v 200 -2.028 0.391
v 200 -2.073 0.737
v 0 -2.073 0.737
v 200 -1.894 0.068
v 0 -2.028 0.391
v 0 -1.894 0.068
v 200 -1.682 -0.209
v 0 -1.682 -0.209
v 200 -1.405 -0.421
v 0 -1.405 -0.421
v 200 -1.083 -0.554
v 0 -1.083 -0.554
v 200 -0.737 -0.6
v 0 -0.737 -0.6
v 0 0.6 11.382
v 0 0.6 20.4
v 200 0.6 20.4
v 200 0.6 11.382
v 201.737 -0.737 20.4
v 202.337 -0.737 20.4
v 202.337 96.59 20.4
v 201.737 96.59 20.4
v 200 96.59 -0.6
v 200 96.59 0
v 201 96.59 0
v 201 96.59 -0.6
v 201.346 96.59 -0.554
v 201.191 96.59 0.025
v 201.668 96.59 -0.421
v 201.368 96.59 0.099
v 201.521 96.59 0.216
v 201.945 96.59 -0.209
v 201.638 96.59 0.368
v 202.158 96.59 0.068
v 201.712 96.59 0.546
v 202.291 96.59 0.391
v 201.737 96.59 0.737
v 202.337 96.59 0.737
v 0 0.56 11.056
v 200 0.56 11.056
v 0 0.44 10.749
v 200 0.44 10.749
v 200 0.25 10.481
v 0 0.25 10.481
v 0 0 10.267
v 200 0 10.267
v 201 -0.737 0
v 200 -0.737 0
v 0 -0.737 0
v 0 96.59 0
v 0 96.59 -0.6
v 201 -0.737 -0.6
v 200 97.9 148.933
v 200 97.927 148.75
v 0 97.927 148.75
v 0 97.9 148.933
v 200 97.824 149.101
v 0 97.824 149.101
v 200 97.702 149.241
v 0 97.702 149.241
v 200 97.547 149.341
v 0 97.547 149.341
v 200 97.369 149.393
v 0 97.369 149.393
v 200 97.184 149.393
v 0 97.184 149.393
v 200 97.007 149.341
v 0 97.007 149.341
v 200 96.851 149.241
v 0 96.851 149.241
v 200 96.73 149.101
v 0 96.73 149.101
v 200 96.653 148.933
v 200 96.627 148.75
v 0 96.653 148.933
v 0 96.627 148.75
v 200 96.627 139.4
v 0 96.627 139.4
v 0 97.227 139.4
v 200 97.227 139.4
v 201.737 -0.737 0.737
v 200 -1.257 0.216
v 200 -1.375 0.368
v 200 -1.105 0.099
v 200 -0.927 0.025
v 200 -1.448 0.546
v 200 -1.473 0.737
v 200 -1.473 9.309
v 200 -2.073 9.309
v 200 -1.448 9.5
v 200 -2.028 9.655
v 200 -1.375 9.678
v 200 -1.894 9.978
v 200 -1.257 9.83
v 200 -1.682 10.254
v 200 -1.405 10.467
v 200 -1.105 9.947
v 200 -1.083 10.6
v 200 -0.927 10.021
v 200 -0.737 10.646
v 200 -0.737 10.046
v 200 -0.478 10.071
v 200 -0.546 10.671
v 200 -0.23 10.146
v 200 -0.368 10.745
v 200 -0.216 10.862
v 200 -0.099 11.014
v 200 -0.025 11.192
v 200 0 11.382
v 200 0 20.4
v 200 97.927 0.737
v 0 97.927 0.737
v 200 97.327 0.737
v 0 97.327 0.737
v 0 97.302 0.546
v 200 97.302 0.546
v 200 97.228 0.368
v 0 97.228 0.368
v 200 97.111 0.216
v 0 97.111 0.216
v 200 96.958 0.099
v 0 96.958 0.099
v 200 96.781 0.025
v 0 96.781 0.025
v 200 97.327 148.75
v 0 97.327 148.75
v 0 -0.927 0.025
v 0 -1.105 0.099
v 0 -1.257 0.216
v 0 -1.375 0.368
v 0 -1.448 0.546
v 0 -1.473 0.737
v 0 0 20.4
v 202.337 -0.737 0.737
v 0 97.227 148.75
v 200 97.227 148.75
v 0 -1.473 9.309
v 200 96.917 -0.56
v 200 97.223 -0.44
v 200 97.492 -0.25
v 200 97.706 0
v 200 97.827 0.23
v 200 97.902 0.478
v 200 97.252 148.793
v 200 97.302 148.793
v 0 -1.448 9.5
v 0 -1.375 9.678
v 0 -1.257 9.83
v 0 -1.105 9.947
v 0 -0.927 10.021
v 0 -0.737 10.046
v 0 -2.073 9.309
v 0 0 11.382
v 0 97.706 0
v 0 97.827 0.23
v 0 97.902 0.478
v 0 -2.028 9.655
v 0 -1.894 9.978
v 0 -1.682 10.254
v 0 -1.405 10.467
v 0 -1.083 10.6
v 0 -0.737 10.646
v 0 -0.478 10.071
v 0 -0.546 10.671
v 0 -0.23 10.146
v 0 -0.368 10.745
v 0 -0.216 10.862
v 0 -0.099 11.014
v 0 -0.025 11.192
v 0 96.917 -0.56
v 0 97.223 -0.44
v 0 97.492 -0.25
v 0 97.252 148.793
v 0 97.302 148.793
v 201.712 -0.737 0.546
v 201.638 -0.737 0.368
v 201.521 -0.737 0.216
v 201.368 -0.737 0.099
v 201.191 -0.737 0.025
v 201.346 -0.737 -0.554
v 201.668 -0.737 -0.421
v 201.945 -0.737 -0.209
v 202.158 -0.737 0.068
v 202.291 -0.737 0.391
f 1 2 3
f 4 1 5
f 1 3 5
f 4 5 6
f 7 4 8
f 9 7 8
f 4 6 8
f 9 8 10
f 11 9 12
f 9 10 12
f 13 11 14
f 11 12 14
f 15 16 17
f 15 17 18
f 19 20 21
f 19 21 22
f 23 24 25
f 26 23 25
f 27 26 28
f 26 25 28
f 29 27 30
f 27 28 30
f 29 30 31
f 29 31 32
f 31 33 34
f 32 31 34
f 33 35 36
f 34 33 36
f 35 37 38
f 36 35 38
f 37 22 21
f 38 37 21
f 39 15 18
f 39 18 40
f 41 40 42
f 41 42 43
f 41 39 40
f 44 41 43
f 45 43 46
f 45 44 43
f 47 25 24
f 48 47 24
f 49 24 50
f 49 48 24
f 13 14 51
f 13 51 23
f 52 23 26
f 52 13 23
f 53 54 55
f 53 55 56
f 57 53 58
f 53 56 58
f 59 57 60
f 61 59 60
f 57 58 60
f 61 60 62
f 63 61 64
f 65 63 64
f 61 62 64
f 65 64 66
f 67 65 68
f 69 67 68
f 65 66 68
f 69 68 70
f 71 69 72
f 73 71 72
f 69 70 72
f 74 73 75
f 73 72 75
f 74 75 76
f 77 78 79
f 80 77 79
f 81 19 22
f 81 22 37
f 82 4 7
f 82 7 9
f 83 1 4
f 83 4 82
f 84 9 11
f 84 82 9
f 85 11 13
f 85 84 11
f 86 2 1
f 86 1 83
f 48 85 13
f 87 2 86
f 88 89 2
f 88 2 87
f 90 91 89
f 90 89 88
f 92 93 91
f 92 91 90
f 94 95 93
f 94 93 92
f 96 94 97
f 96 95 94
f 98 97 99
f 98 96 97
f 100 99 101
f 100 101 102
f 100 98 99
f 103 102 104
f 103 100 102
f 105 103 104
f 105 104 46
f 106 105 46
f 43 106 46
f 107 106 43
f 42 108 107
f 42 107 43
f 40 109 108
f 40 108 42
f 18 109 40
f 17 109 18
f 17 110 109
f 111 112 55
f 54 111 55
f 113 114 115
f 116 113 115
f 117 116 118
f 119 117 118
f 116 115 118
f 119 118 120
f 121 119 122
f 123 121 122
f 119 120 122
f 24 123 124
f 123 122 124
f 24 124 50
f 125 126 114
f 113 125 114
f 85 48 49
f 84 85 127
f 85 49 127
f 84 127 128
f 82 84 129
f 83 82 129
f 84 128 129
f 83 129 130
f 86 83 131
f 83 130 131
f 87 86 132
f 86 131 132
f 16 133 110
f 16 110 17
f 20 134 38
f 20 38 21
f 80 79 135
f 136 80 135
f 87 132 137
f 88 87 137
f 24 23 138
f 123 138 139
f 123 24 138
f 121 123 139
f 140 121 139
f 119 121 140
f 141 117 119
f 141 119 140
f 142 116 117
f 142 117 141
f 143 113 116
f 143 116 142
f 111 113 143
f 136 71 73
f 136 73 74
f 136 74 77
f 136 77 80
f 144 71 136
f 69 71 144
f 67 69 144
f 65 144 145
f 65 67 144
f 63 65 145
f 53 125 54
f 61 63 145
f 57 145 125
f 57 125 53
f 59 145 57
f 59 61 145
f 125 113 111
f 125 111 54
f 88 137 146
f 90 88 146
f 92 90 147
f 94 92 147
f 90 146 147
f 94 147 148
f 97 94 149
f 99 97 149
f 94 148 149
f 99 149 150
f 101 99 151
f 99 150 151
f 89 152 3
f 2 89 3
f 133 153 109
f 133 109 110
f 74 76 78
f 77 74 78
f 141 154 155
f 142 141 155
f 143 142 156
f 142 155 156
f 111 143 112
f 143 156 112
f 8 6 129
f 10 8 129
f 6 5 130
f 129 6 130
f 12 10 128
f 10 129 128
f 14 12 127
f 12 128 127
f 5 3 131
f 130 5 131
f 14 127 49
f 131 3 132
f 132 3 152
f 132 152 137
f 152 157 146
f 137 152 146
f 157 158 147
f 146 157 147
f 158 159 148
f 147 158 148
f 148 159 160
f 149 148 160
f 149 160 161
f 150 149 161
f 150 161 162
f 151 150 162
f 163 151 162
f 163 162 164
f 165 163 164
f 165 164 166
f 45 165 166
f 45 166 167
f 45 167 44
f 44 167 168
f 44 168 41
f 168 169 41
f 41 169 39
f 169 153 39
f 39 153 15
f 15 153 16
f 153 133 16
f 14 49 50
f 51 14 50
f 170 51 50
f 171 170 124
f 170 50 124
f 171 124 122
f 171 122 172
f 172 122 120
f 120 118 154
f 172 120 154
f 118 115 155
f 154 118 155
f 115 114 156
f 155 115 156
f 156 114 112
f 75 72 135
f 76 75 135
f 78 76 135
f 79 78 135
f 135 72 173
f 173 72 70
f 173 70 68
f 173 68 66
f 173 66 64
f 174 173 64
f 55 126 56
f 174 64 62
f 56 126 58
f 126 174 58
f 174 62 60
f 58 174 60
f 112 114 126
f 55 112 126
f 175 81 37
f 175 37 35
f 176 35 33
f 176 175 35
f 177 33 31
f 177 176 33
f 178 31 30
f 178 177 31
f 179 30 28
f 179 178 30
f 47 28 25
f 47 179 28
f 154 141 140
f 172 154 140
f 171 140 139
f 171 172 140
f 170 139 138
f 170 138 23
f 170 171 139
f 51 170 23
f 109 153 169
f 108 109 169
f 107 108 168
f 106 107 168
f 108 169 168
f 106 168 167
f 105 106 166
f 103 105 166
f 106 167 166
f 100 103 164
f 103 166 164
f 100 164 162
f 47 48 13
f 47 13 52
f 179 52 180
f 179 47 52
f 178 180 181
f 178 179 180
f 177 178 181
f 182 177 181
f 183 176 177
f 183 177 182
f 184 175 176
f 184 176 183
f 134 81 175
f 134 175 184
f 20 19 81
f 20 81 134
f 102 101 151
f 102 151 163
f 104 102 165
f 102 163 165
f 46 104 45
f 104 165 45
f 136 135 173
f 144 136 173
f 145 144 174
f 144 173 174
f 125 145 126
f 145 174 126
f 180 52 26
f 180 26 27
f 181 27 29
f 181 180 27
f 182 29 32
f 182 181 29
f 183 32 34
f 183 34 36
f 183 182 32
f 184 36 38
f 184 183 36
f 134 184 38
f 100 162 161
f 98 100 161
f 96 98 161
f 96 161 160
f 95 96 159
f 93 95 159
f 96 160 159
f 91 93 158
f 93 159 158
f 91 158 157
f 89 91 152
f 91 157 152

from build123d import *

# Parameters (mm, degrees)
SKETCH1_W                    = 100
SKETCH1_H                    = 200
BASE_FLANGE1_DEPTH           = 0.6
EDGE_FLANGE1_STRIP_W         = 3.8732
EDGE_FLANGE1_STRIP_H         = 0.6
EDGE_FLANGE1_STRIP_CUT_DEPTH = 200
EDGE_FLANGE1_DEPTH           = 200
HEM1_DEPTH                   = 200
HEM1_2_DEPTH                 = 200
EDGE_FLANGE2_STRIP_W         = 3.8732
EDGE_FLANGE2_STRIP_H         = 0.6
EDGE_FLANGE2_STRIP_CUT_DEPTH = 200
EDGE_FLANGE2_DEPTH           = 200
JOG2_DEPTH                   = 200
JOG2_2_DEPTH                 = 200
EDGE_FLANGE4_DEPTH           = 97.3268


# Read off the part's stored shape, not the designer's step: Hem1, Jog2
# Sheet-metal steps are written as plain solids
with BuildPart() as part:
    # Sketch1 → Base-Flange1 (new body)
    with BuildSketch(Plane(origin=(0, 0, 0), x_dir=(0, 1, 0), z_dir=(0, 0, 1))):
        with Locations((50, -100)):
            Rectangle(SKETCH1_W, SKETCH1_H)
    extrude(amount=-BASE_FLANGE1_DEPTH)

    # Edge-Flange1 strip (across the edge) → Edge-Flange1 strip cut (cut)
    with BuildSketch(Plane(origin=(200, 100, 0), x_dir=(0, -1, 0), z_dir=(-1, 0, 0))):
        with Locations((-0.6, -0.3)):
            Rectangle(EDGE_FLANGE1_STRIP_W, EDGE_FLANGE1_STRIP_H)
    extrude(amount=EDGE_FLANGE1_STRIP_CUT_DEPTH, mode=Mode.SUBTRACT)

    # Edge-Flange1 section (across the edge) → Edge-Flange1 (add)
    with BuildSketch(Plane(origin=(200, 100, 0), x_dir=(0, -1, 0), z_dir=(-1, 0, 0))):
        with BuildLine():
            Line((0, 0.7366), (0, 149.4))
            Line((0, 149.4), (0.6, 149.4))
            Line((0.6, 149.4), (0.6, 0.7366))
            ThreePointArc((0.6, 0.7366), (0.815745145, 0.215745145), (1.3366, 0))
            Line((1.3366, 0), (1.3366, -0.6))
            ThreePointArc((1.3366, -0.6), (0.391481076, -0.208518924), (0, 0.7366))
        make_face()
    extrude(amount=EDGE_FLANGE1_DEPTH)

    # Hem1 outline → Hem1 (cut)
    with BuildSketch(Plane.YZ):
        with BuildLine():
            Line((99.4, 149.4), (99.4, 149.39807407))
            ThreePointArc((99.4, 149.39807407), (99.826969601, 149.191588043), (100, 148.75))
            Line((100, 148.75), (100, 149.4))
            Line((100, 149.4), (99.4, 149.4))
        make_face()
    extrude(amount=HEM1_DEPTH, mode=Mode.SUBTRACT)

    # Hem1 2 outline → Hem1 2 (add)
    with BuildSketch(Plane.YZ):
        with BuildLine():
            Line((98.7, 139.4), (99.3, 139.4))
            Line((99.3, 139.4), (99.3, 148.75))
            ThreePointArc((99.3, 148.75), (99.35, 148.8), (99.4, 148.75))
            Line((99.4, 148.75), (99.4, 149.39807407))
            ThreePointArc((99.4, 149.39807407), (98.908411957, 149.226969601), (98.7, 148.75))
            Line((98.7, 148.75), (98.7, 139.4))
        make_face()
    extrude(amount=HEM1_2_DEPTH)

    # Edge-Flange2 strip (across the edge) → Edge-Flange2 strip cut (cut)
    with BuildSketch(Plane.YZ):
        with Locations((-0.6, -0.3)):
            Rectangle(EDGE_FLANGE2_STRIP_W, EDGE_FLANGE2_STRIP_H)
    extrude(amount=EDGE_FLANGE2_STRIP_CUT_DEPTH, mode=Mode.SUBTRACT)

    # Edge-Flange2 section (across the edge) → Edge-Flange2 (add)
    with BuildSketch(Plane.YZ):
        with BuildLine():
            Line((0, 0.7366), (0, 20.4))
            Line((0, 20.4), (0.6, 20.4))
            Line((0.6, 20.4), (0.6, 0.7366))
            ThreePointArc((0.6, 0.7366), (0.815745145, 0.215745145), (1.3366, 0))
            Line((1.3366, 0), (1.3366, -0.6))
            ThreePointArc((1.3366, -0.6), (0.391481076, -0.208518924), (0, 0.7366))
        make_face()
    extrude(amount=EDGE_FLANGE2_DEPTH)

    # Jog2 outline → Jog2 (cut)
    with BuildSketch(Plane.YZ):
        with BuildLine():
            ThreePointArc((0.6, 11.382443736), (0.440480949, 10.74921392), (0, 10.26713212))
            Line((0, 10.26713212), (0, 0.7366))
            ThreePointArc((0, 0.7366), (0.056516982, 0.352039176), (0.221288384, 0))
            Line((0.221288384, 0), (1.3366, 0))
            ThreePointArc((1.3366, 0), (0.815745145, 0.215745145), (0.6, 0.7366))
            Line((0.6, 0.7366), (0.6, 11.382443736))
        make_face()
        with BuildLine():
            ThreePointArc((97.705511616, 0), (97.223429816, -0.440480949), (96.5902, -0.6))
            Line((96.5902, -0.6), (98.6634, -0.6))
            ThreePointArc((98.6634, -0.6), (99.608518924, -0.208518924), (100, 0.7366))
            Line((100, 0.7366), (100, 148.75))
            ThreePointArc((100, 148.75), (99.35, 149.4), (98.7, 148.75))
            Line((98.7, 148.75), (98.7, 139.4))
            Line((98.7, 139.4), (99.3, 139.4))
            Line((99.3, 139.4), (99.3, 148.75))
            ThreePointArc((99.3, 148.75), (99.35, 148.8), (99.4, 148.75))
            Line((99.4, 148.75), (99.4, 0.7366))
            ThreePointArc((99.4, 0.7366), (99.184254855, 0.215745145), (98.6634, 0))
            Line((98.6634, 0), (97.705511616, 0))
        make_face()
    extrude(amount=JOG2_DEPTH, mode=Mode.SUBTRACT)

    # Jog2 2 outline → Jog2 2 (add)
    with BuildSketch(Plane.YZ):
        with BuildLine():
            ThreePointArc((-0.7366, 10.645843736), (-1.681718924, 10.25436266), (-2.0732, 9.309243736))
            Line((-2.0732, 9.309243736), (-2.0732, 0.7366))
            ThreePointArc((-2.0732, 0.7366), (-1.681718924, -0.208518924), (-0.7366, -0.6))
            Line((-0.7366, -0.6), (1.3366, -0.6))
            ThreePointArc((1.3366, -0.6), (0.703370184, -0.440480949), (0.221288384, 0))
            Line((0.221288384, 0), (-0.7366, 0))
            ThreePointArc((-0.7366, 0), (-1.257454855, 0.215745145), (-1.4732, 0.7366))
            Line((-1.4732, 0.7366), (-1.4732, 9.309243736))
            ThreePointArc((-1.4732, 9.309243736), (-1.257454855, 9.830098591), (-0.7366, 10.045843736))
            ThreePointArc((-0.7366, 10.045843736), (-0.352039176, 10.102360718), (0, 10.26713212))
            Line((0, 10.26713212), (0, 11.382443736))
            ThreePointArc((0, 11.382443736), (-0.215745145, 10.861588881), (-0.7366, 10.645843736))
        make_face()
        with BuildLine():
            Line((96.5902, 0), (97.705511616, 0))
            ThreePointArc((97.705511616, 0), (97.870283018, 0.352039176), (97.9268, 0.7366))
            Line((97.9268, 0.7366), (97.9268, 148.75))
            ThreePointArc((97.9268, 148.75), (97.2768, 149.4), (96.6268, 148.75))
            Line((96.6268, 148.75), (96.6268, 139.4))
            Line((96.6268, 139.4), (97.2268, 139.4))
            Line((97.2268, 139.4), (97.2268, 148.75))
            ThreePointArc((97.2268, 148.75), (97.2768, 148.8), (97.3268, 148.75))
            Line((97.3268, 148.75), (97.3268, 0.7366))
            ThreePointArc((97.3268, 0.7366), (97.111054855, 0.215745145), (96.5902, 0))
        make_face()
    extrude(amount=JOG2_2_DEPTH)

    # Edge-Flange4 section (across the edge) → Edge-Flange4 (add)
    with BuildSketch(Plane(origin=(201.7366, -0.7366, 0), x_dir=(-1, 0, 0), z_dir=(0, 1, 0))):
        with BuildLine():
            Line((-0.6, 0.7366), (-0.6, 20.4))
            Line((-0.6, 20.4), (0, 20.4))
            Line((0, 20.4), (0, 0.7366))
            ThreePointArc((0, 0.7366), (0.215745145, 0.215745145), (0.7366, 0))
            Line((0.7366, 0), (1.7366, 0))
            Line((1.7366, 0), (1.7366, -0.6))
            Line((1.7366, -0.6), (0.7366, -0.6))
            ThreePointArc((0.7366, -0.6), (-0.208518924, -0.208518924), (-0.6, 0.7366))
        make_face()
    extrude(amount=EDGE_FLANGE4_DEPTH)


solid = part.part
